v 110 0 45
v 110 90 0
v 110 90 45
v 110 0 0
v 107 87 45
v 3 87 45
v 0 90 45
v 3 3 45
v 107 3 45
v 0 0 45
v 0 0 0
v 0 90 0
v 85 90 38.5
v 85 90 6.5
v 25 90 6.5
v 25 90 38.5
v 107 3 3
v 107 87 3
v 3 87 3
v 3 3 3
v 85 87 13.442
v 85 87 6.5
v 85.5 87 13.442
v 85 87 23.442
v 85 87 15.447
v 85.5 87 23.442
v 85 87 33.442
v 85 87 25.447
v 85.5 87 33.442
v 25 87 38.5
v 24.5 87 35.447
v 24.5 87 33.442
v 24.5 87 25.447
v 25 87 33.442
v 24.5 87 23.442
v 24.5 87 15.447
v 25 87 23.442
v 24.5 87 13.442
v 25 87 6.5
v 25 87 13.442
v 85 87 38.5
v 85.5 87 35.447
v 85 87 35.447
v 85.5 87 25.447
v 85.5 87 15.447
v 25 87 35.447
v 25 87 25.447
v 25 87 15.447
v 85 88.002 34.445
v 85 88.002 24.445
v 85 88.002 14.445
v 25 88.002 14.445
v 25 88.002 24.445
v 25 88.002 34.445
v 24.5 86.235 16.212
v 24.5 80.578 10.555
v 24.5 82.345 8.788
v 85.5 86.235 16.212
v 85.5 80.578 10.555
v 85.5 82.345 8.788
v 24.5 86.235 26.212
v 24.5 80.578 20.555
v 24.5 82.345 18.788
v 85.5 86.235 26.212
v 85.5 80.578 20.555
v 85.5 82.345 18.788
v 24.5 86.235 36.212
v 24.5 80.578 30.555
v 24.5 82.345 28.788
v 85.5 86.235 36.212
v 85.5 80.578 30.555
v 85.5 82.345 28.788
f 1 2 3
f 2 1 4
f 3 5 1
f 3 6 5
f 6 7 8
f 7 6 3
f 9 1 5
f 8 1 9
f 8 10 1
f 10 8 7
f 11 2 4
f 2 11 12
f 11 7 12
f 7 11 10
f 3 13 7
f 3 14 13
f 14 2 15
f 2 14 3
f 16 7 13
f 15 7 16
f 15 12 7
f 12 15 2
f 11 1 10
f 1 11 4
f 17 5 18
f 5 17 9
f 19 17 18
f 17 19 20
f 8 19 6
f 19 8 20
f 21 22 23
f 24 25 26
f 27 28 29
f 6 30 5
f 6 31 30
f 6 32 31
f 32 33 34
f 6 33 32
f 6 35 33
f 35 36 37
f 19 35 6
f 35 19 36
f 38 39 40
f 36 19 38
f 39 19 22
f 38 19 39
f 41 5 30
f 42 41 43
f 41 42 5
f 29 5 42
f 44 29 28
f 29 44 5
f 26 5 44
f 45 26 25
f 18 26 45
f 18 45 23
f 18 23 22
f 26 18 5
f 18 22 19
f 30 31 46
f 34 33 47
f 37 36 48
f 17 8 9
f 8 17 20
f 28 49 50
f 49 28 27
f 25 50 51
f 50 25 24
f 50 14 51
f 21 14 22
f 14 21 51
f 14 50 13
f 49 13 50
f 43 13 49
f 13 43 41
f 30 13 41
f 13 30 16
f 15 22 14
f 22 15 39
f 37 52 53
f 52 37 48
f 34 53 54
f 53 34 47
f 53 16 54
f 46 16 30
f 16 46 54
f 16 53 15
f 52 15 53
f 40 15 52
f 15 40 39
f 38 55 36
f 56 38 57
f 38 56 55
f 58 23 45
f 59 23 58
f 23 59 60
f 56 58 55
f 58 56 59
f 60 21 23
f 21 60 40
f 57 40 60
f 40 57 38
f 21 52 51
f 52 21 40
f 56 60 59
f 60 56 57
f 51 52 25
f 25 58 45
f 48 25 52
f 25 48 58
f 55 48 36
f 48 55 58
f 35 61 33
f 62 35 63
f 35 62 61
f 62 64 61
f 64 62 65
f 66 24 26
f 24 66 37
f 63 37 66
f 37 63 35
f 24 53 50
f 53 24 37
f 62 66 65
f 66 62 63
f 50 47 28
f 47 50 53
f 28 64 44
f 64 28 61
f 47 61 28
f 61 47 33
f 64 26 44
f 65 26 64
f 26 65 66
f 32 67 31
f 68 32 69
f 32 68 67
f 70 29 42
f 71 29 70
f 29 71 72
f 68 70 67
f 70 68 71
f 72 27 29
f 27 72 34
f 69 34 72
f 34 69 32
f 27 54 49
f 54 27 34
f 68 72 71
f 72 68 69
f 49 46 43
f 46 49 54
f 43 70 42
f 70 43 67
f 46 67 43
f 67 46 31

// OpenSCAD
$fn = 32;

// ----------------------------------------------------------------------
// Vent box: louvers enclosure
// ----------------------------------------------------------------------

// --- parameters (mm) ---
box_l = 110;              // box length, X
box_w = 90;               // box width, Y
box_h = 45;               // box height, Z
wall_t = 3;               // shell wall thickness
win_l = 60;               // vent window width, X
win_h = 32;               // vent window height, Z
slat_t = 2.5;             // louver slat thickness
slat_d = 8;               // louver slat depth
slat_a = 45;              // louver slat angle, degrees
slat_pitch = 10;          // louver pitch
slat_yc = 84.29;          // slat centreline Y

win_z0 = (box_h - win_h) / 2;  // window lower edge Z
n_slats = 3;  // louver count
slat_z0 = win_z0 + (win_h - (n_slats - 1) * slat_pitch) / 2;

difference() {
  union() {
    difference() {
      cube([box_l, box_w, box_h]);
  translate([wall_t, wall_t, wall_t])
    cube([box_l - 2 * wall_t, box_w - 2 * wall_t, box_h]);
  translate([(box_l - win_l) / 2, box_w - wall_t - 1, win_z0])
    cube([win_l, wall_t + 2, win_h]);
    }
    for (i = [0 : n_slats - 1])
      translate([box_l / 2, slat_yc, slat_z0 + i * slat_pitch])
        rotate([slat_a, 0, 0])
          cube([win_l + 1, slat_d, slat_t], center = true);
  }
}
